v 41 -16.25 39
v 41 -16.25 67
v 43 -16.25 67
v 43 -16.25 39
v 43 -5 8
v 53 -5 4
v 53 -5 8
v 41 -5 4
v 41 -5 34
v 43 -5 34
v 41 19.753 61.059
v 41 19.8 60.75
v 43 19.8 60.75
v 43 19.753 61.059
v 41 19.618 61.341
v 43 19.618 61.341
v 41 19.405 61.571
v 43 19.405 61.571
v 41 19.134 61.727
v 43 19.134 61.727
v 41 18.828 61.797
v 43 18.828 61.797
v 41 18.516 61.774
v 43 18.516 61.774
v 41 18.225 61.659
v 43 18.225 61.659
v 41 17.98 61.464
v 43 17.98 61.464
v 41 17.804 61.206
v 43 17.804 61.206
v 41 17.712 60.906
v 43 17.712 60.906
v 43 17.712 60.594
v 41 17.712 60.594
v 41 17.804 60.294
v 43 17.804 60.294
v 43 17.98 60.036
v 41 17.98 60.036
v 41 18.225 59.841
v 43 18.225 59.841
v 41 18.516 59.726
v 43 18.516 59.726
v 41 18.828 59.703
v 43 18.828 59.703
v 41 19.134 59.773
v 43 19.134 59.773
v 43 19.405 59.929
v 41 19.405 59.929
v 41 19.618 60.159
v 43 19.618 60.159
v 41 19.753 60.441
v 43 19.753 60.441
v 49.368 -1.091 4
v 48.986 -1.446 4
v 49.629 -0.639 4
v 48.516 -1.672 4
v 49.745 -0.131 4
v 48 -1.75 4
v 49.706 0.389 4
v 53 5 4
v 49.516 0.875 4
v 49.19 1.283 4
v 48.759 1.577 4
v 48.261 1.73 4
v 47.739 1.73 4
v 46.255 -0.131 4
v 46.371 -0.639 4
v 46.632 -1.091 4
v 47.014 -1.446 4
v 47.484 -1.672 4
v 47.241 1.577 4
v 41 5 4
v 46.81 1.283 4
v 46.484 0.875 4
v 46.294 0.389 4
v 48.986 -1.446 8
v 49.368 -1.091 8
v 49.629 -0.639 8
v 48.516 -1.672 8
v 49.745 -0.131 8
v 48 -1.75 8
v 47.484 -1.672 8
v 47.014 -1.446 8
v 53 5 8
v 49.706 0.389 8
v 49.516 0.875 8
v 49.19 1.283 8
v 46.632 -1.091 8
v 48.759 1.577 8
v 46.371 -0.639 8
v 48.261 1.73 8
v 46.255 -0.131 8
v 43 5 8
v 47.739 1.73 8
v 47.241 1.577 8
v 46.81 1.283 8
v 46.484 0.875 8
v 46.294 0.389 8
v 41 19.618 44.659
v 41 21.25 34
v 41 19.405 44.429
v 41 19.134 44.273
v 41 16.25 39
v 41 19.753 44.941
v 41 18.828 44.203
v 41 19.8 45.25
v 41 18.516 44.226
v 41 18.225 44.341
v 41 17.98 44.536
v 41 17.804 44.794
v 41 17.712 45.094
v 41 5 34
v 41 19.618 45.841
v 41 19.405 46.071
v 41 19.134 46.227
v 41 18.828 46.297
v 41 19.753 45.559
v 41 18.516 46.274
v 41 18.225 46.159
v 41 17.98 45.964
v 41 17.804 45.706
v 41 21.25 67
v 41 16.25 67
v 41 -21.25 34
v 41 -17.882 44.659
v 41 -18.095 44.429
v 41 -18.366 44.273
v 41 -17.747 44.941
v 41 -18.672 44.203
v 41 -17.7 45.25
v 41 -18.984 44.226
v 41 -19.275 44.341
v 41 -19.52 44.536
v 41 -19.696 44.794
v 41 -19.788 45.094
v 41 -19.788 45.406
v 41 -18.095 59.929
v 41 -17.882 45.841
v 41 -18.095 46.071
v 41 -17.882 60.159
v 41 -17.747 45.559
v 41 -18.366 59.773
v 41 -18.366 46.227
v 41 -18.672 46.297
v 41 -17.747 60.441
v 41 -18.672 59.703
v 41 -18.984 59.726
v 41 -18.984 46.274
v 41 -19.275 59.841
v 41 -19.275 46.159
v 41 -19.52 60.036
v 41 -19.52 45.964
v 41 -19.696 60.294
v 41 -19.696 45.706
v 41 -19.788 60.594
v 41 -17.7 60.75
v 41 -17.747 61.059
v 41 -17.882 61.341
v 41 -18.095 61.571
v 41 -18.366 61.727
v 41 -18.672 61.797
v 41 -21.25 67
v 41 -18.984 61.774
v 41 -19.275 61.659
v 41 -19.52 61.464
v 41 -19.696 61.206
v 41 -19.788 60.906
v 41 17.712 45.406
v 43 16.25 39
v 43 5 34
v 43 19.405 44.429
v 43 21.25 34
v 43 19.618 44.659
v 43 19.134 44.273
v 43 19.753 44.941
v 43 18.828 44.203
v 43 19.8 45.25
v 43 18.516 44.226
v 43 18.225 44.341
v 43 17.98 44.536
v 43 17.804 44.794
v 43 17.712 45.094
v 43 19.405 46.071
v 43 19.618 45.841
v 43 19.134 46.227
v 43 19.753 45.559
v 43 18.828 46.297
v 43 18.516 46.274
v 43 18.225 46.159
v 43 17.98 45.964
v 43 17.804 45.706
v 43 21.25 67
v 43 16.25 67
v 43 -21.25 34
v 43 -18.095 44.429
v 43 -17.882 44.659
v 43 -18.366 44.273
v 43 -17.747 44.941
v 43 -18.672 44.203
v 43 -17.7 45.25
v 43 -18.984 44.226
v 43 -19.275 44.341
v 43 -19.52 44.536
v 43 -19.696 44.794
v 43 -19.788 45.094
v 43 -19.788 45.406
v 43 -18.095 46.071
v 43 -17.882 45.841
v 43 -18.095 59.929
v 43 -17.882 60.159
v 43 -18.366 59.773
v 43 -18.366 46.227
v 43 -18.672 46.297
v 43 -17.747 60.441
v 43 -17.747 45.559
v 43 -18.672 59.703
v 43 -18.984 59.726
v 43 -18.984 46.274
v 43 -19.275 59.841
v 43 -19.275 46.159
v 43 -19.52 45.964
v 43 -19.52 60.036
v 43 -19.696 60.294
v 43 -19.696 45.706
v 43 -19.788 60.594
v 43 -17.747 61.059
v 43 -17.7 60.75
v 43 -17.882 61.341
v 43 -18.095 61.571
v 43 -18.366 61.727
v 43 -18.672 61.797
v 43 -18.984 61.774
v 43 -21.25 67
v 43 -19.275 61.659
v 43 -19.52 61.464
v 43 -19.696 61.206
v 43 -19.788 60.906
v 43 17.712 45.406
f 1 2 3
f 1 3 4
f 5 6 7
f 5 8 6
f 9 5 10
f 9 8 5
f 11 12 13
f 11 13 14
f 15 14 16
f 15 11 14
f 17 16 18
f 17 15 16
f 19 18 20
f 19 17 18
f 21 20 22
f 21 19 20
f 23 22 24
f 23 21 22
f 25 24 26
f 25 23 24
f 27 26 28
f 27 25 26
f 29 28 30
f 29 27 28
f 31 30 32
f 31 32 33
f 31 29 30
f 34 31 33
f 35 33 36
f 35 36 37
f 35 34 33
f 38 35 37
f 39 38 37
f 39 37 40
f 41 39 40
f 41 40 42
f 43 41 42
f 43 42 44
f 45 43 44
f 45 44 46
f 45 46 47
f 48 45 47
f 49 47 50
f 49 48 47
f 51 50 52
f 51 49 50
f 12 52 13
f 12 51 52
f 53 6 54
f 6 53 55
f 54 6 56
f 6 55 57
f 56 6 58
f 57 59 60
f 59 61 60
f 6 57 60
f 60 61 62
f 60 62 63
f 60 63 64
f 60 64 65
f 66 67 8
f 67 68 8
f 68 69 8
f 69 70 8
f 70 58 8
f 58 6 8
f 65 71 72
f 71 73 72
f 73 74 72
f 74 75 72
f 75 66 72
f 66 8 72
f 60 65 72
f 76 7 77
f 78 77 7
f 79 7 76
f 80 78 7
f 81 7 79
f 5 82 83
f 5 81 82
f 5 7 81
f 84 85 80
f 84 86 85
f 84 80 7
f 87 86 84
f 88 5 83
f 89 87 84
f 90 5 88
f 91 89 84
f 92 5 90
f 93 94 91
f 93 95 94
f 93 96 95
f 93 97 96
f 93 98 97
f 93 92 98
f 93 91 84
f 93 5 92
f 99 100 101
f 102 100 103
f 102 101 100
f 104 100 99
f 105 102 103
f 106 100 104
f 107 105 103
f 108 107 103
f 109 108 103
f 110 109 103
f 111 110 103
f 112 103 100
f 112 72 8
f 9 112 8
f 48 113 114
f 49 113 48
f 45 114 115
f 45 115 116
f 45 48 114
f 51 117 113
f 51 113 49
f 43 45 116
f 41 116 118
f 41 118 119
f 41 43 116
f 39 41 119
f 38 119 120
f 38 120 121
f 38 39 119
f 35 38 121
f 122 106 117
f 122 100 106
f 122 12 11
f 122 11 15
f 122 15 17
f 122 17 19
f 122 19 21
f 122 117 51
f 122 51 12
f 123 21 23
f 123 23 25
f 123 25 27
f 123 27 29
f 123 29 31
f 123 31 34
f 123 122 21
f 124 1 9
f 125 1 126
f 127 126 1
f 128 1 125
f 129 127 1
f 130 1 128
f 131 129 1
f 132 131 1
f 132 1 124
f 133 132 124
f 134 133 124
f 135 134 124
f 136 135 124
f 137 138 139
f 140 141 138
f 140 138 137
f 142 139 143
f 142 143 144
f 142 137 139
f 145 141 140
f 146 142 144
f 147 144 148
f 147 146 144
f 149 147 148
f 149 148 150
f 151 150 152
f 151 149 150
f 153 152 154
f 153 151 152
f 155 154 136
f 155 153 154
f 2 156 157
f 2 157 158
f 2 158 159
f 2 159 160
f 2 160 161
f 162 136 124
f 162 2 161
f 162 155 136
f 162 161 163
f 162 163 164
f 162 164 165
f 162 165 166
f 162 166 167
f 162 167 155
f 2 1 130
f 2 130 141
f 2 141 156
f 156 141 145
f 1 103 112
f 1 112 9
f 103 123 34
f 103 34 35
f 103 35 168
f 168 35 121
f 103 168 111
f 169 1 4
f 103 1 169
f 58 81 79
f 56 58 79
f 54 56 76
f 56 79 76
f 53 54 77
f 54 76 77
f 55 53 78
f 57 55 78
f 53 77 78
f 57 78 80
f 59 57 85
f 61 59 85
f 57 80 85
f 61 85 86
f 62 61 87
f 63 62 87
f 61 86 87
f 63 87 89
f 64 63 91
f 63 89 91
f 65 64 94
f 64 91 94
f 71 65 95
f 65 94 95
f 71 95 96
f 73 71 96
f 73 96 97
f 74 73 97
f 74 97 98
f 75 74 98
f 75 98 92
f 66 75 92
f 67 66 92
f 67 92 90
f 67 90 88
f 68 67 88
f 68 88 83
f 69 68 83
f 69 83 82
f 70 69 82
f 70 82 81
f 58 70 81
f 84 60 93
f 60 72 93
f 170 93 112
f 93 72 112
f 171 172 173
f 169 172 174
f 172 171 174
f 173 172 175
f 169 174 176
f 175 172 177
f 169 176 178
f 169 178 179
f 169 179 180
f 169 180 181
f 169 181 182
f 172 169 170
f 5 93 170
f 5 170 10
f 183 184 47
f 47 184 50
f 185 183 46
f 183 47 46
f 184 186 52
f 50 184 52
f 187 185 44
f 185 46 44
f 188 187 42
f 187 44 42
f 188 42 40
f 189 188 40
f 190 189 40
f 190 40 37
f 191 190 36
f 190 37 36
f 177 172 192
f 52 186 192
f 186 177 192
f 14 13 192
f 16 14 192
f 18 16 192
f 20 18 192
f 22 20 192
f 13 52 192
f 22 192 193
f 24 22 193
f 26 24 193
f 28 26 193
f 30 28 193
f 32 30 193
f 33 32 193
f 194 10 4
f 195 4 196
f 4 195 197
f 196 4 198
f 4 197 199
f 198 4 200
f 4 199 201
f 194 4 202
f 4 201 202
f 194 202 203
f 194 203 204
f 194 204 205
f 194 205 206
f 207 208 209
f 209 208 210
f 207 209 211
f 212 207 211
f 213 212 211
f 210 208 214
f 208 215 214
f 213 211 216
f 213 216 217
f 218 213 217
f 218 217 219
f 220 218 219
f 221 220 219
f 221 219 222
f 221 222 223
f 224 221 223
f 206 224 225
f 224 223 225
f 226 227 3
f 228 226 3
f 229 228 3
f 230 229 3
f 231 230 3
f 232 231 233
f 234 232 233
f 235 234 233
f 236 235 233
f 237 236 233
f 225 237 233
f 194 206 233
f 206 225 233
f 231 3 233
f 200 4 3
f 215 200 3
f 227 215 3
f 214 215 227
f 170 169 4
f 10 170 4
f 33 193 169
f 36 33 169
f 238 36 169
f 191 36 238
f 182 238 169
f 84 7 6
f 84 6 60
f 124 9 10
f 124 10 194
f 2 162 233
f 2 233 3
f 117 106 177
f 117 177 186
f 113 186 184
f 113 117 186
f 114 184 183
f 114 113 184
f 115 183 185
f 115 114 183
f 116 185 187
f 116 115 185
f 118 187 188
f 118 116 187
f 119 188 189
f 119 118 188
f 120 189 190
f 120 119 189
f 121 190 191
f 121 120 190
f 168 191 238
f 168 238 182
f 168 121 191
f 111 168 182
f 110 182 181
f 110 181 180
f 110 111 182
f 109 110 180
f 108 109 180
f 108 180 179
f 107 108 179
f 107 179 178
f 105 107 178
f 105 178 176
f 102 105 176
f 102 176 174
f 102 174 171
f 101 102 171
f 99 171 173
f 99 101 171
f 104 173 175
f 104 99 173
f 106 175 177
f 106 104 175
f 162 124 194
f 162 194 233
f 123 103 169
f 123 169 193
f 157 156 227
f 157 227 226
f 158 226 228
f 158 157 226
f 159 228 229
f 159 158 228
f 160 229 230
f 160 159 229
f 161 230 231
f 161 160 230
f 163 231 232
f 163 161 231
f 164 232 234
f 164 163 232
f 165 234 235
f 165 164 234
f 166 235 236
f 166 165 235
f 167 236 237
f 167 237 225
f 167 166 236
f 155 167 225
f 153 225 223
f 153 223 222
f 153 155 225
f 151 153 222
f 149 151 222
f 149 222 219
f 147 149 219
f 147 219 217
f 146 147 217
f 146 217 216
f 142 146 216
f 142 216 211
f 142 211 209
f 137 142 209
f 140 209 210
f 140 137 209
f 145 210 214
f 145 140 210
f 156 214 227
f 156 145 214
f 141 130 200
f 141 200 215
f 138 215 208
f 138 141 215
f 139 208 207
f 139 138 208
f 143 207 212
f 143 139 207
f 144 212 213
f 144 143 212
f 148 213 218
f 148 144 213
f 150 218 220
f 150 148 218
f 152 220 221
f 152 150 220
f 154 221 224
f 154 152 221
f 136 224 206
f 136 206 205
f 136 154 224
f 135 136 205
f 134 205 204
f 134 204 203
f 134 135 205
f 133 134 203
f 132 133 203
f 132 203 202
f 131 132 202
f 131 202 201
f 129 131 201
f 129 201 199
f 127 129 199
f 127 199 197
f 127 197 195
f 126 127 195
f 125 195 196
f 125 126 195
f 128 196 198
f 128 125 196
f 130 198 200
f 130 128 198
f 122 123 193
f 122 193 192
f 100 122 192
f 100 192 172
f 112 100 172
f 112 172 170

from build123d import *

# Parameters (mm, degrees)
SKETCH056_R     = 1.05
PAD039_DEPTH    = 2
SKETCH057_W     = 10
SKETCH057_H     = 4
PAD040_DEPTH    = 10
SKETCH058_R     = 1.75
POCKET009_DEPTH = 4.001


with BuildPart() as part:
    # Sketch056 → Pad039 (new body)
    with BuildSketch(Plane.YZ):
        Polygon((-21.25, 67), (-16.25, 67), (-16.25, 39), (16.25, 39), (16.25, 67), (21.25, 67), (21.25, 34), (5, 34), (5, 4), (-5, 4), (-5, 34), (-21.25, 34), align=None)
        with Locations((-18.75, 60.75)):
            Circle(SKETCH056_R, mode=Mode.SUBTRACT)
        with Locations((-18.75, 45.25)):
            Circle(SKETCH056_R, mode=Mode.SUBTRACT)
        with Locations((18.75, 45.25)):
            Circle(SKETCH056_R, mode=Mode.SUBTRACT)
        with Locations((18.75, 60.75)):
            Circle(SKETCH056_R, mode=Mode.SUBTRACT)
    extrude(amount=PAD039_DEPTH)

    # Sketch057 (on Face18 of Pad039) → Pad040 (join)
    with BuildSketch(Plane.YZ.offset(2)):
        with Locations((0, 6)):
            Rectangle(SKETCH057_W, SKETCH057_H)
    extrude(amount=PAD040_DEPTH)

    # Sketch058 (on Face19 of Pad040) → Pocket009 (cut, through all)
    with BuildSketch(Plane(origin=(0, 0, 8), x_dir=(0, -1, 0), z_dir=(0, 0, 1))):
        with Locations((0, 7)):
            Circle(SKETCH058_R)
    extrude(amount=-POCKET009_DEPTH, mode=Mode.SUBTRACT)


with BuildPart() as part_1:
    # Body013 placement: moved
    add(part.part.moved(Location((41, 0, 0))))


solid = part_1.part
